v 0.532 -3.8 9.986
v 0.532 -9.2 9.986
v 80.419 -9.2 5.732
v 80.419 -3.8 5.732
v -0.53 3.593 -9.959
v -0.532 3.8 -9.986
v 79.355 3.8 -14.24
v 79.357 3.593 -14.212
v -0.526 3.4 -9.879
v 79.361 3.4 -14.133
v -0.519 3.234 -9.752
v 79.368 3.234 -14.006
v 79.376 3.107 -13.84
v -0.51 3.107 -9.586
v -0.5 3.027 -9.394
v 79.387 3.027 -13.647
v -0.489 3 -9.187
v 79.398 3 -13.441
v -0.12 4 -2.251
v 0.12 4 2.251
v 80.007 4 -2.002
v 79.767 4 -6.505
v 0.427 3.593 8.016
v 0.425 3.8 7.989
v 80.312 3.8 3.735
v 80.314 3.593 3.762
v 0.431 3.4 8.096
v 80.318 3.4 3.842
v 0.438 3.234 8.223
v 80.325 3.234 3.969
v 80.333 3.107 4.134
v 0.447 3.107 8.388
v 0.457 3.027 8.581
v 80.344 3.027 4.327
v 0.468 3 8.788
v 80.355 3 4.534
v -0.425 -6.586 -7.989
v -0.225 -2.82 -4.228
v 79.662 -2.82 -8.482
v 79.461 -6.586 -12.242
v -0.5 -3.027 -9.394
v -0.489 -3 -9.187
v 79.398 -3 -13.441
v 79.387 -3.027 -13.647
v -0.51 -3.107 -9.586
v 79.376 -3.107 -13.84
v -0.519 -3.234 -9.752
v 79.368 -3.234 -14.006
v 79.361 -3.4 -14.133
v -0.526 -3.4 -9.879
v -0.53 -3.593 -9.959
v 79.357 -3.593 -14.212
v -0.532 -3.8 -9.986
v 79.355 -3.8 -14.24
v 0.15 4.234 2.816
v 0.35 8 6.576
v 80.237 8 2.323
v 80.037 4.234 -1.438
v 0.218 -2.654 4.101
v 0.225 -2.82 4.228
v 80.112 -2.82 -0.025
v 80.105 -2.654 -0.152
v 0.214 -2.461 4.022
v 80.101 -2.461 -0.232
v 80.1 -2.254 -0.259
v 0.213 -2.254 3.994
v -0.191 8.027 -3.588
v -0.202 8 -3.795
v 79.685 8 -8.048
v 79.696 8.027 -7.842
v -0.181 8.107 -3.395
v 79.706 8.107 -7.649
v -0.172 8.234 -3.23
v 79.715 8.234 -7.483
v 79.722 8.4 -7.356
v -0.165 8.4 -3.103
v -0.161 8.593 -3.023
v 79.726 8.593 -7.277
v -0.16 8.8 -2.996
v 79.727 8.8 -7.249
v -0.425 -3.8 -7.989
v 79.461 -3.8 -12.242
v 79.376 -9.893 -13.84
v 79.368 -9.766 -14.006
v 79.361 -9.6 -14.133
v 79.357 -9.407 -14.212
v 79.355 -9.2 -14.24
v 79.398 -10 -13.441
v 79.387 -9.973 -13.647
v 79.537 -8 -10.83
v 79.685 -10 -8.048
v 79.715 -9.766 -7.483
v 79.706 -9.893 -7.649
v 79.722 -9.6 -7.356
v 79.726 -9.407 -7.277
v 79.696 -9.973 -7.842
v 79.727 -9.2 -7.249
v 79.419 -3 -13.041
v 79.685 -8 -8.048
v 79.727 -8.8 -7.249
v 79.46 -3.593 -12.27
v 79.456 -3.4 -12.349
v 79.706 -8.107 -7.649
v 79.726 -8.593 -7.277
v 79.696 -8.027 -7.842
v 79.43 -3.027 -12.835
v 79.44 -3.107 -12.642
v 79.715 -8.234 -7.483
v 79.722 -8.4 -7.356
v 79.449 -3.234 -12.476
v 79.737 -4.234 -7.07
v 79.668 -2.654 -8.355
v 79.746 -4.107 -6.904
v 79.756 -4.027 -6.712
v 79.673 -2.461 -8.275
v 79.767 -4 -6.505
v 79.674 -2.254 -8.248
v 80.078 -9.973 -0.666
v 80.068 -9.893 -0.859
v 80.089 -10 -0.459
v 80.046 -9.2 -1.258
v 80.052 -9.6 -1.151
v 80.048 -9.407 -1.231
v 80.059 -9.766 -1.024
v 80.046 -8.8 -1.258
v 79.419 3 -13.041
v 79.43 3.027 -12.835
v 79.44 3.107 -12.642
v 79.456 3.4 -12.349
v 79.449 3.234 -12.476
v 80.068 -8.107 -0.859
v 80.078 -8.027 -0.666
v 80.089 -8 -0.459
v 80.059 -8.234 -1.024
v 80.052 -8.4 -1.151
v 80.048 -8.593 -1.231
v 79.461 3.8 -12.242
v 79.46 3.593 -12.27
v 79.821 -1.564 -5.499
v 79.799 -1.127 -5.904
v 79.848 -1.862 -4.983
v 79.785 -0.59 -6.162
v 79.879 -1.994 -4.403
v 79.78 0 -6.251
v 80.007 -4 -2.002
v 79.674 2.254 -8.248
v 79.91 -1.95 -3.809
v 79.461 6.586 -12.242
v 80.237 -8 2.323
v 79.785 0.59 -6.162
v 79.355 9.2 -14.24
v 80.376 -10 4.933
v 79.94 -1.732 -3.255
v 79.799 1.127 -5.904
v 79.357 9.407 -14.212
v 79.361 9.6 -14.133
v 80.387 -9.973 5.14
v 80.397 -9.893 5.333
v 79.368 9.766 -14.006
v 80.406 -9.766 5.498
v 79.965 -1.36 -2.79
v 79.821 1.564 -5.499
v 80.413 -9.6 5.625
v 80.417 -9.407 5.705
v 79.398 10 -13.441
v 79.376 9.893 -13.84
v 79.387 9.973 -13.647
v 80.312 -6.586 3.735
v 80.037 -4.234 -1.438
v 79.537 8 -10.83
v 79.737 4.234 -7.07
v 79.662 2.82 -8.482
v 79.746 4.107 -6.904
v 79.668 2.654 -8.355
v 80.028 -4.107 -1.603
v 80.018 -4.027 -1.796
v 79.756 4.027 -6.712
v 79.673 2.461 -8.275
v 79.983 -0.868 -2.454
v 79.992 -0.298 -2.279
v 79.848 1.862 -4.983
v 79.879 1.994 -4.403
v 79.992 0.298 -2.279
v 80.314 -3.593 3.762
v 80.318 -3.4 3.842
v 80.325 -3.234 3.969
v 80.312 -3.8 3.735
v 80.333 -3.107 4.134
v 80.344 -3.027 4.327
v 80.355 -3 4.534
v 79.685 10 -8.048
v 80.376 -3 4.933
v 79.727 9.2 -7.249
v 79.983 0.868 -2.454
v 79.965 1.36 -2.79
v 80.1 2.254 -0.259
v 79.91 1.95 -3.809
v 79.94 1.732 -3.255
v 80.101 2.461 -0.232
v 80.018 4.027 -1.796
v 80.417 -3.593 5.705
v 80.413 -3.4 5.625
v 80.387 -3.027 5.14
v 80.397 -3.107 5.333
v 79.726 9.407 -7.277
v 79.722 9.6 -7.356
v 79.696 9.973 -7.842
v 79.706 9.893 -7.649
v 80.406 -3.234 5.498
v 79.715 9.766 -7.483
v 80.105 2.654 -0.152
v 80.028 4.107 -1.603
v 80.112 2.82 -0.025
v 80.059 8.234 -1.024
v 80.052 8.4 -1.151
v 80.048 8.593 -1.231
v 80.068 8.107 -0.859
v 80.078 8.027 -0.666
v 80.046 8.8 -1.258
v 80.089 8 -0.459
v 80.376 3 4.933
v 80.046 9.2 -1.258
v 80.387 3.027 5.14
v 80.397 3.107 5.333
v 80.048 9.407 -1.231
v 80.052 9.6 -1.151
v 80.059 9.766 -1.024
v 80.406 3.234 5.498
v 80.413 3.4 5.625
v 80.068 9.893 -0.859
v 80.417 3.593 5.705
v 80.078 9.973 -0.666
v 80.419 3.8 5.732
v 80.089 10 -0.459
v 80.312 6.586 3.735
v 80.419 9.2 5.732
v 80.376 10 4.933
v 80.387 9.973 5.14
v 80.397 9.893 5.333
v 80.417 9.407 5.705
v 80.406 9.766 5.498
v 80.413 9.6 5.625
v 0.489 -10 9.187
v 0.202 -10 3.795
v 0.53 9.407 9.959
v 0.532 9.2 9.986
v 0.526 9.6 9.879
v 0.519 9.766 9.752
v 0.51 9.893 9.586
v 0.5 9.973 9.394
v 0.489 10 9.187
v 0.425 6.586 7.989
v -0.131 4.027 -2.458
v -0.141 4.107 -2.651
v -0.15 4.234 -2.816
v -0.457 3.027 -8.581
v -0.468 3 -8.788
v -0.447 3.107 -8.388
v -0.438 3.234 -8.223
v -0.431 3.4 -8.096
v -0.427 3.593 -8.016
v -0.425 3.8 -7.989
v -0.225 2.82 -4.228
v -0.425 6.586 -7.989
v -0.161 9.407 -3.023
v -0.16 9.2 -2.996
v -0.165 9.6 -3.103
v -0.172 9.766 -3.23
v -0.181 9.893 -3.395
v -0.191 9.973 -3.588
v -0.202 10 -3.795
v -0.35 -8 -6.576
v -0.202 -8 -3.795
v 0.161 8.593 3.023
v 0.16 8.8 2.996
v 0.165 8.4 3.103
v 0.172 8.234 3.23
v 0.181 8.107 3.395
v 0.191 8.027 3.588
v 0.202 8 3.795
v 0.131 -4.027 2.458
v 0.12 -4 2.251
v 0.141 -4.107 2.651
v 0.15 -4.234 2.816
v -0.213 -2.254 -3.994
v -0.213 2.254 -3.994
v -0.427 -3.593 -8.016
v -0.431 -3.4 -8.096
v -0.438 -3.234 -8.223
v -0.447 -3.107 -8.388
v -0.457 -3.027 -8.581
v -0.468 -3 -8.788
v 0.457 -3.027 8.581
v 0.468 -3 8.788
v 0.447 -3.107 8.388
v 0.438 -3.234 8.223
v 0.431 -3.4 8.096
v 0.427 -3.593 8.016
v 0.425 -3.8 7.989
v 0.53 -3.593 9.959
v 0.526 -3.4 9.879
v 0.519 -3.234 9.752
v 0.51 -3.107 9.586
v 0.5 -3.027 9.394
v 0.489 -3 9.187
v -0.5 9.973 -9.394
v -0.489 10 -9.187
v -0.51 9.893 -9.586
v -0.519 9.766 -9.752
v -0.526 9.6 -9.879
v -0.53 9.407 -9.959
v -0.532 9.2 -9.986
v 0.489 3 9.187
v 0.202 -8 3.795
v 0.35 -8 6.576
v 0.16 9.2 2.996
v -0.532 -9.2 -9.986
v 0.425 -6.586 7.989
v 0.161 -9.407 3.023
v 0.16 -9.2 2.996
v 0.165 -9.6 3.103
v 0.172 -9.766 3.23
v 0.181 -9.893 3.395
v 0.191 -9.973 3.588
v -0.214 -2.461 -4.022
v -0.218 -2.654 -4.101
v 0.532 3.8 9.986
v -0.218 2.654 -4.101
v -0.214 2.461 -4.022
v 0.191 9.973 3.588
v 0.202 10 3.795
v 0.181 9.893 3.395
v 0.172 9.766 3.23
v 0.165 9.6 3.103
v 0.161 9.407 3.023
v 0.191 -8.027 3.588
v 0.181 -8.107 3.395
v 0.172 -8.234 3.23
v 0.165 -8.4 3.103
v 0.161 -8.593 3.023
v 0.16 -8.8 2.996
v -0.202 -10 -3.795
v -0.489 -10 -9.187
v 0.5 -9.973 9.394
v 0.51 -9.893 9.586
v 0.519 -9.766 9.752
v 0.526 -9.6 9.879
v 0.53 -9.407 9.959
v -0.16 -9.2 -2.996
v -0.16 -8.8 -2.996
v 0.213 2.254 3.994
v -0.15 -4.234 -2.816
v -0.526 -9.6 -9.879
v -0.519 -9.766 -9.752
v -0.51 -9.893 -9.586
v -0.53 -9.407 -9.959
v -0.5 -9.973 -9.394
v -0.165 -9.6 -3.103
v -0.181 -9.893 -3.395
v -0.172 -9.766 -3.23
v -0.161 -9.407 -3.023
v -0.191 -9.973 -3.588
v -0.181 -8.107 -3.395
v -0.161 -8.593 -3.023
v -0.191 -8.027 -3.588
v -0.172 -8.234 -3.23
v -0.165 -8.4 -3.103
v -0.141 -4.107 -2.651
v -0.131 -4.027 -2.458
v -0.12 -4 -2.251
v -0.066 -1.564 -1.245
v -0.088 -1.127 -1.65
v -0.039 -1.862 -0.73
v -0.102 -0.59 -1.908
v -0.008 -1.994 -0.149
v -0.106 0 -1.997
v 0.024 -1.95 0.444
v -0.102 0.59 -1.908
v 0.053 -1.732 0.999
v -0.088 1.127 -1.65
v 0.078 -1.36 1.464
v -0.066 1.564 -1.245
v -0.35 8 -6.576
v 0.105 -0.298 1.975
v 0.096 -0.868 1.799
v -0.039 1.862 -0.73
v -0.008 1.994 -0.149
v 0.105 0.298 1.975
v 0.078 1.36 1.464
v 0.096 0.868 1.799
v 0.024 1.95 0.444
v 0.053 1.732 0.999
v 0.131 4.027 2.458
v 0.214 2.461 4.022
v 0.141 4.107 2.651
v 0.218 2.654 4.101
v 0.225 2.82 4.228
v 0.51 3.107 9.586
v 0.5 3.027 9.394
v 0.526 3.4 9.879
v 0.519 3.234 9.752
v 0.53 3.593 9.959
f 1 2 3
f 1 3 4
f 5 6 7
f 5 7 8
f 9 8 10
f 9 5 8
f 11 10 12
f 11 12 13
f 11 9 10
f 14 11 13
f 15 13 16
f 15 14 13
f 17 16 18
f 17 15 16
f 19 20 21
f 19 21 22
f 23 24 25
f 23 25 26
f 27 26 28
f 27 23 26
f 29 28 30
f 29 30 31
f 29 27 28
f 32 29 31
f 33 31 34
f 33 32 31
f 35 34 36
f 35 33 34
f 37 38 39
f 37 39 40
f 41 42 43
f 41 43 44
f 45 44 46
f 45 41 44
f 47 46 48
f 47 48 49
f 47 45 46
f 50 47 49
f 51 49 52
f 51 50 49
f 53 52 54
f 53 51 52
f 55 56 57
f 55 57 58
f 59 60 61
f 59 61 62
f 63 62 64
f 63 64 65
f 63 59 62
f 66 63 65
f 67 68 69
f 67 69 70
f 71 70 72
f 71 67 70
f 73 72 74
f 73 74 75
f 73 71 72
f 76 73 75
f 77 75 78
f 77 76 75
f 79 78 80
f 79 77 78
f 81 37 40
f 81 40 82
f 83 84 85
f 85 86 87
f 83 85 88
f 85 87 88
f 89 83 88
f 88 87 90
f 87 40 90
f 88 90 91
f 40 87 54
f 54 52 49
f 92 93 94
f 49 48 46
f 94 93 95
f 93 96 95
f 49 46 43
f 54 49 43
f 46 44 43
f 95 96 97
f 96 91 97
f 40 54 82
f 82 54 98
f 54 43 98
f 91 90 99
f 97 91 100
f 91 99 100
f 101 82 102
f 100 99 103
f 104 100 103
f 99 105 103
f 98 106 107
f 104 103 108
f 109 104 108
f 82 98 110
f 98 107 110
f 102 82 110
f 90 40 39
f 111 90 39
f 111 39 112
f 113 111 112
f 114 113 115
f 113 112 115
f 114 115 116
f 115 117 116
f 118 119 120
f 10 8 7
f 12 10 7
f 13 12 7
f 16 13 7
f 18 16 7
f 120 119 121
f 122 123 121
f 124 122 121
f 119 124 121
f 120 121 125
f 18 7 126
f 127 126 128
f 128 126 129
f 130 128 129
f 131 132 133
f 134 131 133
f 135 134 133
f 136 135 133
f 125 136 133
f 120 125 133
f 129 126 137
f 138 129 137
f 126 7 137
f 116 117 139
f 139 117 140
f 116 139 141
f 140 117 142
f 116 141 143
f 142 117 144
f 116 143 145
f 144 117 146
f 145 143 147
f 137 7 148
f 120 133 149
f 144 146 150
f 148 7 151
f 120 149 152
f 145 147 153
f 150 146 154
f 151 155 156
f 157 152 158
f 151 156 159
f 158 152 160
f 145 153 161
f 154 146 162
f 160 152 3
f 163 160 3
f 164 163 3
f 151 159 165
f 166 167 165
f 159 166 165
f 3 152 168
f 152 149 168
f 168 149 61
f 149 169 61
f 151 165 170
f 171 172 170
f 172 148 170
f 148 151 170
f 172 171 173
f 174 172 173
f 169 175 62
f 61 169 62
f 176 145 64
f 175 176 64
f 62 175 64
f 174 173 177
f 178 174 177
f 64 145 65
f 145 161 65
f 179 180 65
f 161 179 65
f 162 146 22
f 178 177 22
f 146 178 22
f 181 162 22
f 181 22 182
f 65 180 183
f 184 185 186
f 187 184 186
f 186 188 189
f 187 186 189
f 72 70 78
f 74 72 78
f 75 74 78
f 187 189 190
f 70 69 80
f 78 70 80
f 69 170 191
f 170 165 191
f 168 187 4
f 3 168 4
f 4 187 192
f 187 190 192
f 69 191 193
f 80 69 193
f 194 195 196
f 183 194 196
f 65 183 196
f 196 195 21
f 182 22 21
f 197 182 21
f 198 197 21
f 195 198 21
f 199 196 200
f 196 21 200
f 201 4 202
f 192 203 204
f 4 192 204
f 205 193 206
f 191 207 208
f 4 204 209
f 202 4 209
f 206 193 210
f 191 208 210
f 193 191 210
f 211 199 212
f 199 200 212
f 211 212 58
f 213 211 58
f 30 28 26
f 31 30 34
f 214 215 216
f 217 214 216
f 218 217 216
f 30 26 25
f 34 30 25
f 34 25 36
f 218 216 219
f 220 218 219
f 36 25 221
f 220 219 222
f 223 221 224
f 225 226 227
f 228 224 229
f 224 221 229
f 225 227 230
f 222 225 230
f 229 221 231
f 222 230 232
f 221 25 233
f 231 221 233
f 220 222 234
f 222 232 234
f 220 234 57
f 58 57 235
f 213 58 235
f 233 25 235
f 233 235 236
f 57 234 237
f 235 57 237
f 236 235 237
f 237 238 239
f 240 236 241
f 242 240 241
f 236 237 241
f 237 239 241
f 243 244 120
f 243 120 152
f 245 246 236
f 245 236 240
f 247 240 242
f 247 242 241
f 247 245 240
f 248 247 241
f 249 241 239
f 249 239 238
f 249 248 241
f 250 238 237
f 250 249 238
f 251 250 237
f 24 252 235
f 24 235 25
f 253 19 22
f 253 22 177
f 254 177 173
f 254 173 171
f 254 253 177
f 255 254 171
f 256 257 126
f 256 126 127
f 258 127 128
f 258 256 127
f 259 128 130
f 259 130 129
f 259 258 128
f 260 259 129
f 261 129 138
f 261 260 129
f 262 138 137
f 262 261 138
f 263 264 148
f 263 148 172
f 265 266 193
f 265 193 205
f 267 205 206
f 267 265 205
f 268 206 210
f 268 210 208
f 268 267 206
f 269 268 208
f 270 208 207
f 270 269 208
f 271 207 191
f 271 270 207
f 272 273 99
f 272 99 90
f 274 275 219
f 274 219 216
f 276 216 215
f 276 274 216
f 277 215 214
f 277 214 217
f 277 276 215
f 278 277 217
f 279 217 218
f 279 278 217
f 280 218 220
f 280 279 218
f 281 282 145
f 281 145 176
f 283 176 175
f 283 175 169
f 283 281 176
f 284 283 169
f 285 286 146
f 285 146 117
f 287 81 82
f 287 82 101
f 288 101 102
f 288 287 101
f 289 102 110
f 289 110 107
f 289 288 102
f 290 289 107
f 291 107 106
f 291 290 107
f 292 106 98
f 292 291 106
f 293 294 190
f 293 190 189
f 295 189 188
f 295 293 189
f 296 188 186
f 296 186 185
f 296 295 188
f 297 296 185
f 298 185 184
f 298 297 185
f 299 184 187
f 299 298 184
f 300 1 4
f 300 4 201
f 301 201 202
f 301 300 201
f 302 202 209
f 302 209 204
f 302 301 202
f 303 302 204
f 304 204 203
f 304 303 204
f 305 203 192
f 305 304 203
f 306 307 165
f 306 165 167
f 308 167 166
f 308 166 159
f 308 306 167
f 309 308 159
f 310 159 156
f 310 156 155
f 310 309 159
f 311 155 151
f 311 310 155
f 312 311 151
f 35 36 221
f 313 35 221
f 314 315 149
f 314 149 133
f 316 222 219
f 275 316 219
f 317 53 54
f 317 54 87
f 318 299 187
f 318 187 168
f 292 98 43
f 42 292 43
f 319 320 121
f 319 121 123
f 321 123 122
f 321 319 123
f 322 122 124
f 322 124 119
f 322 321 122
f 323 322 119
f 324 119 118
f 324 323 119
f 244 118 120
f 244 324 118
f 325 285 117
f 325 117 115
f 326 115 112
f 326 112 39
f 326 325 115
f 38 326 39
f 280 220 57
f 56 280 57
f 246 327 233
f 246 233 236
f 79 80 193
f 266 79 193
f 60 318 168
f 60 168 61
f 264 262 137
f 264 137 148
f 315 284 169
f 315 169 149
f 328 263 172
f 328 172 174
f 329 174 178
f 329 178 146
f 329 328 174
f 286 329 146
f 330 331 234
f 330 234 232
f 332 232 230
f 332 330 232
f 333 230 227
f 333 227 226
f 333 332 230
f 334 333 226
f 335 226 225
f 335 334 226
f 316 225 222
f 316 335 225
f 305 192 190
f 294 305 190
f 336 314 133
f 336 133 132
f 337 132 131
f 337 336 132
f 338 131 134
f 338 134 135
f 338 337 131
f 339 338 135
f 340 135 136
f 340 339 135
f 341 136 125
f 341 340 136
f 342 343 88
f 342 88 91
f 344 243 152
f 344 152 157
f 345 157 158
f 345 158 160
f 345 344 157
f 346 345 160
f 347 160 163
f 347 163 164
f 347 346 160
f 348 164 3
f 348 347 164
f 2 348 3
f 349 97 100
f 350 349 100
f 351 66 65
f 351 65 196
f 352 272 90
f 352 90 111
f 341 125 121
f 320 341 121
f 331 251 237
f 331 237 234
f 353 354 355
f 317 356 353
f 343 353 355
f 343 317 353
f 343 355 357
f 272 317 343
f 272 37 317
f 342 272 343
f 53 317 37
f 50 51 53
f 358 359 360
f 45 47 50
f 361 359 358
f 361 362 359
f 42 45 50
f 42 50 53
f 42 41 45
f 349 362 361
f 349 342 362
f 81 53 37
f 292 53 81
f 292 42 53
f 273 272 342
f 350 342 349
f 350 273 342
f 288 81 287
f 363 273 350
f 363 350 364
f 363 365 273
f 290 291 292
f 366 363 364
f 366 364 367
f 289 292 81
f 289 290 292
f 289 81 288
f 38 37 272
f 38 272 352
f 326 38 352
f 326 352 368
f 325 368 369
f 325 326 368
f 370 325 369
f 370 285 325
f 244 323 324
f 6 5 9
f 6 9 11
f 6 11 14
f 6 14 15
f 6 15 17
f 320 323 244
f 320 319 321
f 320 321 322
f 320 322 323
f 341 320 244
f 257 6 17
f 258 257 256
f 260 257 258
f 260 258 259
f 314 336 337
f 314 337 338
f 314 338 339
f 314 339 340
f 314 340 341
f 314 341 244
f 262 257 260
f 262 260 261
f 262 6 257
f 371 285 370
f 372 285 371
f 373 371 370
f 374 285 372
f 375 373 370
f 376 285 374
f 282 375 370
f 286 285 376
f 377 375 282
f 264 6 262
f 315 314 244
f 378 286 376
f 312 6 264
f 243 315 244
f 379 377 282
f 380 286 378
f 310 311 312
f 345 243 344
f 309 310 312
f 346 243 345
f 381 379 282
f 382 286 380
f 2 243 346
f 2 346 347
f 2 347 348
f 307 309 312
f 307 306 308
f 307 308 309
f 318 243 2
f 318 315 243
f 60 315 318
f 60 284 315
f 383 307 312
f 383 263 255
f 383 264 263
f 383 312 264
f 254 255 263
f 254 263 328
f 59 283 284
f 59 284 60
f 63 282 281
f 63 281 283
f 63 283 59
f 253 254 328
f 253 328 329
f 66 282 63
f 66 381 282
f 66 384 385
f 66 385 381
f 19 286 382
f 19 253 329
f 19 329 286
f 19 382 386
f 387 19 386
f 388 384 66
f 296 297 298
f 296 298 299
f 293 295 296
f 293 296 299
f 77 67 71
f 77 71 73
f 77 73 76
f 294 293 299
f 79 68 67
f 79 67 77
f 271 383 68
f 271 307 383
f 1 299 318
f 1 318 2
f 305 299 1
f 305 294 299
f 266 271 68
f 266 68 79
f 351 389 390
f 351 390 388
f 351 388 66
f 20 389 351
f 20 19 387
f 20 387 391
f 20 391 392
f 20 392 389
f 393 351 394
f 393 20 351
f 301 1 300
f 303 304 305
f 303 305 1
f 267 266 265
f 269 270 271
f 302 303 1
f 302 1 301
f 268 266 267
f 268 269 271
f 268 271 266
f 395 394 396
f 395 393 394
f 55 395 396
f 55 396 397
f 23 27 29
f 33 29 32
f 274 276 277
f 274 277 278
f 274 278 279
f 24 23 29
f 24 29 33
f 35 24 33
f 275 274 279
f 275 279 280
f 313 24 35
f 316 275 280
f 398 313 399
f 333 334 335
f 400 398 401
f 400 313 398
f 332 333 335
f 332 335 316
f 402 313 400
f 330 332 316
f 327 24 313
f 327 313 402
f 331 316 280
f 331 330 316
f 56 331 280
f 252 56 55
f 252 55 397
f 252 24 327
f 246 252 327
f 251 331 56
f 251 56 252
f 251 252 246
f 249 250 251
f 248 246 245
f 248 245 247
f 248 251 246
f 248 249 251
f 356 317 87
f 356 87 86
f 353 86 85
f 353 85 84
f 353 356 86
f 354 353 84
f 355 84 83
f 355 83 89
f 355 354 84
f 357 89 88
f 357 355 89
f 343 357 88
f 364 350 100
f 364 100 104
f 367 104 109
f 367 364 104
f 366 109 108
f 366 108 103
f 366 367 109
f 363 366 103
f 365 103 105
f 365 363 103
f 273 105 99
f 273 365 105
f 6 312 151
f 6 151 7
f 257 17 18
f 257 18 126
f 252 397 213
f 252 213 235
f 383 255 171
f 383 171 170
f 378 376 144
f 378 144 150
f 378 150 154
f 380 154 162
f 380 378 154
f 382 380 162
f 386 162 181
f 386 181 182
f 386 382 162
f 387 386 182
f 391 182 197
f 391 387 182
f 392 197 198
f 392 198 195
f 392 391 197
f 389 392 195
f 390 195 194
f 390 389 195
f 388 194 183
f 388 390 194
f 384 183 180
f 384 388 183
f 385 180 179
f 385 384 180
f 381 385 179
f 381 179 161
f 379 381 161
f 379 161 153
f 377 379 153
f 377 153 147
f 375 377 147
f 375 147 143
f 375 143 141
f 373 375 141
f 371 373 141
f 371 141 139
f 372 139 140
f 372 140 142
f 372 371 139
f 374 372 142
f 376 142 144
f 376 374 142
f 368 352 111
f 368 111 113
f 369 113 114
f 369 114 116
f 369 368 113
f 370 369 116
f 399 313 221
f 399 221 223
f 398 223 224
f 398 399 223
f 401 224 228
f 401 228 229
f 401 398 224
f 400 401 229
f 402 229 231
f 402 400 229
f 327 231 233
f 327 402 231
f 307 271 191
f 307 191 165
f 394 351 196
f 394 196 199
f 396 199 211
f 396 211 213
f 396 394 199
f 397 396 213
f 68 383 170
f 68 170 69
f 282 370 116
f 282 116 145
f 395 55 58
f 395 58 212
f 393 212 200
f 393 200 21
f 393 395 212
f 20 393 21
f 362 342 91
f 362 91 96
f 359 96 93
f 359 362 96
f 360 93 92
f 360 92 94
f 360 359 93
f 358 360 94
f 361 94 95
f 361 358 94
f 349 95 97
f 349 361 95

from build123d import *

# Parameters (mm, degrees)
SKETCH11_R       = 2
SIZE_4X4_1_DEPTH = 80


with BuildPart() as part:
    # Sketch11 → Size 4X4 (1) (new body)
    with BuildSketch(Plane(origin=(0, 0, 0), x_dir=(-0.05317143033370503, 0, -0.9985853989500688), z_dir=(0.9985853989500688, 0, -0.05317143033370503))):
        with BuildLine():
            Line((-3, 9.2), (-3, 8.8))
            ThreePointArc((-3, 8.8), (-3.234314575, 8.234314575), (-3.8, 8))
            Line((-3.8, 8), (-6.585786438, 8))
            Line((-6.585786438, 8), (-2.820101013, 4.234314575))
            ThreePointArc((-2.820101013, 4.234314575), (-2.560562334, 4.060896374), (-2.254415588, 4))
            Line((-2.254415588, 4), (2.254415588, 4))
            ThreePointArc((2.254415588, 4), (2.560562334, 4.060896374), (2.820101013, 4.234314575))
            Line((2.820101013, 4.234314575), (6.585786438, 8))
            Line((6.585786438, 8), (3.8, 8))
            ThreePointArc((3.8, 8), (3.234314575, 8.234314575), (3, 8.8))
            Line((3, 8.8), (3, 9.2))
            ThreePointArc((3, 9.2), (3.234314575, 9.765685425), (3.8, 10))
            Line((3.8, 10), (9.2, 10))
            ThreePointArc((9.2, 10), (9.765685425, 9.765685425), (10, 9.2))
            Line((10, 9.2), (10, 3.8))
            ThreePointArc((10, 3.8), (9.765685425, 3.234314575), (9.2, 3))
            Line((9.2, 3), (8.8, 3))
            ThreePointArc((8.8, 3), (8.234314575, 3.234314575), (8, 3.8))
            Line((8, 3.8), (8, 6.585786438))
            Line((8, 6.585786438), (4.234314575, 2.820101013))
            ThreePointArc((4.234314575, 2.820101013), (4.060896374, 2.560562334), (4, 2.254415588))
            Line((4, 2.254415588), (4, -2.254415588))
            ThreePointArc((4, -2.254415588), (4.060896374, -2.560562334), (4.234314575, -2.820101013))
            Line((4.234314575, -2.820101013), (8, -6.585786438))
            Line((8, -6.585786438), (8, -3.8))
            ThreePointArc((8, -3.8), (8.234314575, -3.234314575), (8.8, -3))
            Line((8.8, -3), (9.2, -3))
            ThreePointArc((9.2, -3), (9.765685425, -3.234314575), (10, -3.8))
            Line((10, -3.8), (10, -9.2))
            ThreePointArc((10, -9.2), (9.765685425, -9.765685425), (9.2, -10))
            Line((9.2, -10), (3.8, -10))
            ThreePointArc((3.8, -10), (3.234314575, -9.765685425), (3, -9.2))
            Line((3, -9.2), (3, -8.8))
            ThreePointArc((3, -8.8), (3.234314575, -8.234314575), (3.8, -8))
            Line((3.8, -8), (6.585786438, -8))
            Line((6.585786438, -8), (2.820101013, -4.234314575))
            ThreePointArc((2.820101013, -4.234314575), (2.560562334, -4.060896374), (2.254415588, -4))
            Line((2.254415588, -4), (-2.254415588, -4))
            ThreePointArc((-2.254415588, -4), (-2.560562334, -4.060896374), (-2.820101013, -4.234314575))
            Line((-2.820101013, -4.234314575), (-6.585786438, -8))
            Line((-6.585786438, -8), (-3.8, -8))
            ThreePointArc((-3.8, -8), (-3.234314575, -8.234314575), (-3, -8.8))
            Line((-3, -8.8), (-3, -9.2))
            ThreePointArc((-3, -9.2), (-3.234314575, -9.765685425), (-3.8, -10))
            Line((-3.8, -10), (-9.2, -10))
            ThreePointArc((-9.2, -10), (-9.765685425, -9.765685425), (-10, -9.2))
            Line((-10, -9.2), (-10, -3.8))
            ThreePointArc((-10, -3.8), (-9.765685425, -3.234314575), (-9.2, -3))
            Line((-9.2, -3), (-8.8, -3))
            ThreePointArc((-8.8, -3), (-8.234314575, -3.234314575), (-8, -3.8))
            Line((-8, -3.8), (-8, -6.585786438))
            Line((-8, -6.585786438), (-4.234314575, -2.820101013))
            ThreePointArc((-4.234314575, -2.820101013), (-4.060896374, -2.560562334), (-4, -2.254415588))
            Line((-4, -2.254415588), (-4, 2.254415588))
            ThreePointArc((-4, 2.254415588), (-4.060896374, 2.560562334), (-4.234314575, 2.820101013))
            Line((-4.234314575, 2.820101013), (-8, 6.585786438))
            Line((-8, 6.585786438), (-8, 3.8))
            ThreePointArc((-8, 3.8), (-8.234314575, 3.234314575), (-8.8, 3))
            Line((-8.8, 3), (-9.2, 3))
            ThreePointArc((-9.2, 3), (-9.765685425, 3.234314575), (-10, 3.8))
            Line((-10, 3.8), (-10, 9.2))
            ThreePointArc((-10, 9.2), (-9.765685425, 9.765685425), (-9.2, 10))
            Line((-9.2, 10), (-3.8, 10))
            ThreePointArc((-3.8, 10), (-3.234314575, 9.765685425), (-3, 9.2))
        make_face()
        Circle(SKETCH11_R, mode=Mode.SUBTRACT)
    extrude(amount=SIZE_4X4_1_DEPTH)


solid = part.part
